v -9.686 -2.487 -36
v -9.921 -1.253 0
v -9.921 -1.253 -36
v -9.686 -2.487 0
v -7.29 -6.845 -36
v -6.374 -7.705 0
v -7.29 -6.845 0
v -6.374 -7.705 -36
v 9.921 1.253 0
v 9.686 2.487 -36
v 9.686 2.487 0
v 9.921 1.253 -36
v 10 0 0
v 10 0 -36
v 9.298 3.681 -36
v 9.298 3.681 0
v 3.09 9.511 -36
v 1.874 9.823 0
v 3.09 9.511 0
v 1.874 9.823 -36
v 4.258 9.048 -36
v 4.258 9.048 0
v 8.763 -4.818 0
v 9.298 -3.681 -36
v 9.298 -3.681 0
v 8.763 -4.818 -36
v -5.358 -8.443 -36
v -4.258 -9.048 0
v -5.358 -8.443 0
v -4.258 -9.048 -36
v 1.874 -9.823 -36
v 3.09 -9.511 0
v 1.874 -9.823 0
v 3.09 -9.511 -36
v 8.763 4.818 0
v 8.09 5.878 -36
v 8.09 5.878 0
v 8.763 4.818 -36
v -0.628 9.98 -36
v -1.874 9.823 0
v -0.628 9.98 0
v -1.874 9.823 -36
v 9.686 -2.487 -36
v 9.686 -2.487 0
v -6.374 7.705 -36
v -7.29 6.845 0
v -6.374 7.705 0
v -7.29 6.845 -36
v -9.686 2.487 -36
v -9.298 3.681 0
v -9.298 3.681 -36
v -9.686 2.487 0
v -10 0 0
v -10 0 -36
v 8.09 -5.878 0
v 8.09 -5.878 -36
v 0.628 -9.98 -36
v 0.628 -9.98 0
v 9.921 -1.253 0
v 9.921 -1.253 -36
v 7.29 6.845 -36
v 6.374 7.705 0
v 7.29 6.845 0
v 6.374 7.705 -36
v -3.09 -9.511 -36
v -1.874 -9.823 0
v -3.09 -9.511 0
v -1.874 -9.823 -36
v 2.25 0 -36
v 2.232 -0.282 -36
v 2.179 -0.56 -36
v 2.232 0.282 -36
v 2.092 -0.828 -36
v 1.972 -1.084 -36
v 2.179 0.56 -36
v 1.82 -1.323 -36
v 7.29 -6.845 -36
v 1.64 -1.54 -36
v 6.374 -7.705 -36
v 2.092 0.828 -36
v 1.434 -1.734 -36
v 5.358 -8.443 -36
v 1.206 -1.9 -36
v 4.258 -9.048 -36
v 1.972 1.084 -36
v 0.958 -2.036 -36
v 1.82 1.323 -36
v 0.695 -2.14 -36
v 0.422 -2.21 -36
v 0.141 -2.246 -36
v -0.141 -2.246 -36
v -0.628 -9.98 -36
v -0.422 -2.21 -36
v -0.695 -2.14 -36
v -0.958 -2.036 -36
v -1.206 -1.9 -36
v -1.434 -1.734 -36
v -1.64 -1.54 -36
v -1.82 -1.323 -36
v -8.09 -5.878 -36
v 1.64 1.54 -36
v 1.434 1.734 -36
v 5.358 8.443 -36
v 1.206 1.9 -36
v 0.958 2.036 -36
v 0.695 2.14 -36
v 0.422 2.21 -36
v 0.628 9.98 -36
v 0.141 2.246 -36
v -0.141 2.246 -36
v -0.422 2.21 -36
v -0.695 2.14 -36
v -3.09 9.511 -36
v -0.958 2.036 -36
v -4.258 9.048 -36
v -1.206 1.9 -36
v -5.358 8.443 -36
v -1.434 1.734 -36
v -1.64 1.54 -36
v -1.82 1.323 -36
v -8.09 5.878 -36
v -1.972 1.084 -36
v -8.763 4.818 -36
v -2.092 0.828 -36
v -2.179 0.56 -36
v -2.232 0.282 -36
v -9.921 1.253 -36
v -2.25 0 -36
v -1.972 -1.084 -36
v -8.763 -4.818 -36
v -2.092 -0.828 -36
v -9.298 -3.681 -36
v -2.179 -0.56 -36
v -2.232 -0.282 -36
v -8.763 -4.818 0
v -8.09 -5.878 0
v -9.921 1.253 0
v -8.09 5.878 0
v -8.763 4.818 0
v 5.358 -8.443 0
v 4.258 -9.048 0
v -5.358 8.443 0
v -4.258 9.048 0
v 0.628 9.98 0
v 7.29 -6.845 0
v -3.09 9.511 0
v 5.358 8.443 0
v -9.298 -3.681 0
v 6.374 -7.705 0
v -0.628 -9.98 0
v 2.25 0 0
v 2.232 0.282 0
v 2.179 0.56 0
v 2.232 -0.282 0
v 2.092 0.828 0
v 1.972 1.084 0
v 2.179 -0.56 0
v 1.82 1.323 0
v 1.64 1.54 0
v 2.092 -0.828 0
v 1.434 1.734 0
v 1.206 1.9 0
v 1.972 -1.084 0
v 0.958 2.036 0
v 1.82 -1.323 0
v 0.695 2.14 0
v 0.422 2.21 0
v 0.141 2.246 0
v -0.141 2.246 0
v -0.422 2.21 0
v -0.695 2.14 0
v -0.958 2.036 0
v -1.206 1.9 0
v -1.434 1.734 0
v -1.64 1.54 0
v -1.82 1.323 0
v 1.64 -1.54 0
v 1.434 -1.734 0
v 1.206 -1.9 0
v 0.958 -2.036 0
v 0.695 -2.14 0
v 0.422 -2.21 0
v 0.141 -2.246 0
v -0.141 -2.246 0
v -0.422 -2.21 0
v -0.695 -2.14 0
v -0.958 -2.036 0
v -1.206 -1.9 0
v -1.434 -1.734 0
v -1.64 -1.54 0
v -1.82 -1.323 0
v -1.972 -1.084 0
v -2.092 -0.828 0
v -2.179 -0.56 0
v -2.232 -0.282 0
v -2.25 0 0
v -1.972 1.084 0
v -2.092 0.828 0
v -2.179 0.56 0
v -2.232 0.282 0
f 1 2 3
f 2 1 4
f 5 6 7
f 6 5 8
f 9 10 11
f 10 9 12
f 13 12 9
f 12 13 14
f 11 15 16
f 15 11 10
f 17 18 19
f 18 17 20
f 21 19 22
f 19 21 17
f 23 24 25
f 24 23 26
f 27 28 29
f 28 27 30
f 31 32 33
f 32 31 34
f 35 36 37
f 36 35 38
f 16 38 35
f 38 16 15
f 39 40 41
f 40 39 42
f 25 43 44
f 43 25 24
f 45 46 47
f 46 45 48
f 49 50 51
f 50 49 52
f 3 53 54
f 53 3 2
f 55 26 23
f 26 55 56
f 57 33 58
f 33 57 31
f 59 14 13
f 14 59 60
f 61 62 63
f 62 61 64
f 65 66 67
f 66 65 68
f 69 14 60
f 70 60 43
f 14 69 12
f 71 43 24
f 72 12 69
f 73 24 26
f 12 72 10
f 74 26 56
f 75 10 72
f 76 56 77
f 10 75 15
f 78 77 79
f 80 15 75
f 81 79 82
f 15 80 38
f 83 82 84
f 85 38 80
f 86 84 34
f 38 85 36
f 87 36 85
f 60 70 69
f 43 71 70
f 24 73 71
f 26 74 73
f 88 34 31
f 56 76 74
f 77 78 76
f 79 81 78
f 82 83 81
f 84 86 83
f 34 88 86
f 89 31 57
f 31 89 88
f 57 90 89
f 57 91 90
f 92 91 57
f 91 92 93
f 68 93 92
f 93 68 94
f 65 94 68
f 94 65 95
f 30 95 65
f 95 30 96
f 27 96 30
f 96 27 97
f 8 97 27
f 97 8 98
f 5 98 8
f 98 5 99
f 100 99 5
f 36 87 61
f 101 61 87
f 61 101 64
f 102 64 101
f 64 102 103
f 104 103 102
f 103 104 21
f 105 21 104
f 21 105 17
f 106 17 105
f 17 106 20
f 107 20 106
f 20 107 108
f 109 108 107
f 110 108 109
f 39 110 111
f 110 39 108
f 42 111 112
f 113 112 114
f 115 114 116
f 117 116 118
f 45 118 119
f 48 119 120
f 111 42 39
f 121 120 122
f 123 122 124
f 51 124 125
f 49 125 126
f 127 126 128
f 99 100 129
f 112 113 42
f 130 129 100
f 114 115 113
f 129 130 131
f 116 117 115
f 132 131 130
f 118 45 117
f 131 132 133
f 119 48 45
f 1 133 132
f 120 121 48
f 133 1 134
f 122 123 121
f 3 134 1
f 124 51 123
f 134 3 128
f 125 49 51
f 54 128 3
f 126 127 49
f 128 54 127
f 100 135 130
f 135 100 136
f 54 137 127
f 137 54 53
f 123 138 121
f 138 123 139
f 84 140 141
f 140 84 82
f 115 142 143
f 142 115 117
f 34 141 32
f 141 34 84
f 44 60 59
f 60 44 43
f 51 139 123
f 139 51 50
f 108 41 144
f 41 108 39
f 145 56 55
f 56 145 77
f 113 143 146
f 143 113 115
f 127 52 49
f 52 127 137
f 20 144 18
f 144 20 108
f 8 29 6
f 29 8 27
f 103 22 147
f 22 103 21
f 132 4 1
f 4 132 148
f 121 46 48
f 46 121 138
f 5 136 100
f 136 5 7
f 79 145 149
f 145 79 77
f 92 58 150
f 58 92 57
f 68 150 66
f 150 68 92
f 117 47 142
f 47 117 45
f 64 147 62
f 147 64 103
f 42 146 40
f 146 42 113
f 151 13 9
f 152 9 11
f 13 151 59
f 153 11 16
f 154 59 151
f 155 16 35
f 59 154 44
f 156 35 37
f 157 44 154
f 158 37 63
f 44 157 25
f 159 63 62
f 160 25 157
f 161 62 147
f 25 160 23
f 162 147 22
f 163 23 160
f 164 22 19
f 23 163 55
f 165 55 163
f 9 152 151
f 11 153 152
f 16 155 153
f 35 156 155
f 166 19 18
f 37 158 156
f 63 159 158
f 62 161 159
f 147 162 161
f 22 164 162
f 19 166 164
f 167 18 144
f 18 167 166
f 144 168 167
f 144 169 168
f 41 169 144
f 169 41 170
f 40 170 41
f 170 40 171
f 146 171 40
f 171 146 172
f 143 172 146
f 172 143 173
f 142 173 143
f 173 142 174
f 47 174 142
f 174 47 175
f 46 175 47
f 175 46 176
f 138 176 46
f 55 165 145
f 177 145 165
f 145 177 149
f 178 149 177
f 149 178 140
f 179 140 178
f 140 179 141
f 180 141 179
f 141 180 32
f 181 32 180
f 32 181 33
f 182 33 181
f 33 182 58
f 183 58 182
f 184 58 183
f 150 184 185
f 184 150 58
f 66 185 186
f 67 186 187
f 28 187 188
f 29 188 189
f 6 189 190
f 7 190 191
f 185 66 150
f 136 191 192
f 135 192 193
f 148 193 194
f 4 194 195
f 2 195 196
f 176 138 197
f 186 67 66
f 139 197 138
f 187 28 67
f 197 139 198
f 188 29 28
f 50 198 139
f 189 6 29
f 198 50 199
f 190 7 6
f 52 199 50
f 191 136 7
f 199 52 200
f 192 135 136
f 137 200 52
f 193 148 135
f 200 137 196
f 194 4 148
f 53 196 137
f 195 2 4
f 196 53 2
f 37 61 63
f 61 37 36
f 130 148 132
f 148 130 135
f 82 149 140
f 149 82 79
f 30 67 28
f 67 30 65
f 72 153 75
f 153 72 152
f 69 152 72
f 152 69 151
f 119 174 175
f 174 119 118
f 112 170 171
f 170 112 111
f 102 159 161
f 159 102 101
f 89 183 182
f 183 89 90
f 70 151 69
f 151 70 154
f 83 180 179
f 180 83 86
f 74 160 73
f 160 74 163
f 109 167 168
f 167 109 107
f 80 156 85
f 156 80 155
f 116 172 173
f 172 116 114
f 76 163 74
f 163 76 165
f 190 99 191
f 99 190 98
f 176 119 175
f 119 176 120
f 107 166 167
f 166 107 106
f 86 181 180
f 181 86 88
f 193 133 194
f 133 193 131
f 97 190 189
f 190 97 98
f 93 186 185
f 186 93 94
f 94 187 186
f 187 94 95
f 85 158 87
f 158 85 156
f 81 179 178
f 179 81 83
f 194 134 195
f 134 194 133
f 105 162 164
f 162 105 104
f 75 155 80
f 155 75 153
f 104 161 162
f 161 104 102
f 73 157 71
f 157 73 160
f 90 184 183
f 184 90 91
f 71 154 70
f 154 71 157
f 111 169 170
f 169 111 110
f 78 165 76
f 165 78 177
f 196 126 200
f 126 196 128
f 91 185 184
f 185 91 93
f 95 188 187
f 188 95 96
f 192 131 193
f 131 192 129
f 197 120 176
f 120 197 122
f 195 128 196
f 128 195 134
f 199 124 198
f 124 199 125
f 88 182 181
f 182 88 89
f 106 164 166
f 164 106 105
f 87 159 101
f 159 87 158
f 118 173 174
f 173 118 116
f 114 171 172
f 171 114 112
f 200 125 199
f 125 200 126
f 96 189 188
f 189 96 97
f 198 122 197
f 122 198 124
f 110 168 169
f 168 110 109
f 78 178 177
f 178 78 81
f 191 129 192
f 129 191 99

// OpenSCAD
$fn = 50;


difference() {
	union() {
		translate(v = [0, 0, -36.0000000000]) {
			cylinder(h = 36, r = 10.0000000000);
		}
		cylinder(h = 0, r = 16.0000000000);
	}
	union() {
		#translate(v = [0, 0, -36]) {
			cylinder(h = 36, r = 2.2500000000);
		}
	}
}
